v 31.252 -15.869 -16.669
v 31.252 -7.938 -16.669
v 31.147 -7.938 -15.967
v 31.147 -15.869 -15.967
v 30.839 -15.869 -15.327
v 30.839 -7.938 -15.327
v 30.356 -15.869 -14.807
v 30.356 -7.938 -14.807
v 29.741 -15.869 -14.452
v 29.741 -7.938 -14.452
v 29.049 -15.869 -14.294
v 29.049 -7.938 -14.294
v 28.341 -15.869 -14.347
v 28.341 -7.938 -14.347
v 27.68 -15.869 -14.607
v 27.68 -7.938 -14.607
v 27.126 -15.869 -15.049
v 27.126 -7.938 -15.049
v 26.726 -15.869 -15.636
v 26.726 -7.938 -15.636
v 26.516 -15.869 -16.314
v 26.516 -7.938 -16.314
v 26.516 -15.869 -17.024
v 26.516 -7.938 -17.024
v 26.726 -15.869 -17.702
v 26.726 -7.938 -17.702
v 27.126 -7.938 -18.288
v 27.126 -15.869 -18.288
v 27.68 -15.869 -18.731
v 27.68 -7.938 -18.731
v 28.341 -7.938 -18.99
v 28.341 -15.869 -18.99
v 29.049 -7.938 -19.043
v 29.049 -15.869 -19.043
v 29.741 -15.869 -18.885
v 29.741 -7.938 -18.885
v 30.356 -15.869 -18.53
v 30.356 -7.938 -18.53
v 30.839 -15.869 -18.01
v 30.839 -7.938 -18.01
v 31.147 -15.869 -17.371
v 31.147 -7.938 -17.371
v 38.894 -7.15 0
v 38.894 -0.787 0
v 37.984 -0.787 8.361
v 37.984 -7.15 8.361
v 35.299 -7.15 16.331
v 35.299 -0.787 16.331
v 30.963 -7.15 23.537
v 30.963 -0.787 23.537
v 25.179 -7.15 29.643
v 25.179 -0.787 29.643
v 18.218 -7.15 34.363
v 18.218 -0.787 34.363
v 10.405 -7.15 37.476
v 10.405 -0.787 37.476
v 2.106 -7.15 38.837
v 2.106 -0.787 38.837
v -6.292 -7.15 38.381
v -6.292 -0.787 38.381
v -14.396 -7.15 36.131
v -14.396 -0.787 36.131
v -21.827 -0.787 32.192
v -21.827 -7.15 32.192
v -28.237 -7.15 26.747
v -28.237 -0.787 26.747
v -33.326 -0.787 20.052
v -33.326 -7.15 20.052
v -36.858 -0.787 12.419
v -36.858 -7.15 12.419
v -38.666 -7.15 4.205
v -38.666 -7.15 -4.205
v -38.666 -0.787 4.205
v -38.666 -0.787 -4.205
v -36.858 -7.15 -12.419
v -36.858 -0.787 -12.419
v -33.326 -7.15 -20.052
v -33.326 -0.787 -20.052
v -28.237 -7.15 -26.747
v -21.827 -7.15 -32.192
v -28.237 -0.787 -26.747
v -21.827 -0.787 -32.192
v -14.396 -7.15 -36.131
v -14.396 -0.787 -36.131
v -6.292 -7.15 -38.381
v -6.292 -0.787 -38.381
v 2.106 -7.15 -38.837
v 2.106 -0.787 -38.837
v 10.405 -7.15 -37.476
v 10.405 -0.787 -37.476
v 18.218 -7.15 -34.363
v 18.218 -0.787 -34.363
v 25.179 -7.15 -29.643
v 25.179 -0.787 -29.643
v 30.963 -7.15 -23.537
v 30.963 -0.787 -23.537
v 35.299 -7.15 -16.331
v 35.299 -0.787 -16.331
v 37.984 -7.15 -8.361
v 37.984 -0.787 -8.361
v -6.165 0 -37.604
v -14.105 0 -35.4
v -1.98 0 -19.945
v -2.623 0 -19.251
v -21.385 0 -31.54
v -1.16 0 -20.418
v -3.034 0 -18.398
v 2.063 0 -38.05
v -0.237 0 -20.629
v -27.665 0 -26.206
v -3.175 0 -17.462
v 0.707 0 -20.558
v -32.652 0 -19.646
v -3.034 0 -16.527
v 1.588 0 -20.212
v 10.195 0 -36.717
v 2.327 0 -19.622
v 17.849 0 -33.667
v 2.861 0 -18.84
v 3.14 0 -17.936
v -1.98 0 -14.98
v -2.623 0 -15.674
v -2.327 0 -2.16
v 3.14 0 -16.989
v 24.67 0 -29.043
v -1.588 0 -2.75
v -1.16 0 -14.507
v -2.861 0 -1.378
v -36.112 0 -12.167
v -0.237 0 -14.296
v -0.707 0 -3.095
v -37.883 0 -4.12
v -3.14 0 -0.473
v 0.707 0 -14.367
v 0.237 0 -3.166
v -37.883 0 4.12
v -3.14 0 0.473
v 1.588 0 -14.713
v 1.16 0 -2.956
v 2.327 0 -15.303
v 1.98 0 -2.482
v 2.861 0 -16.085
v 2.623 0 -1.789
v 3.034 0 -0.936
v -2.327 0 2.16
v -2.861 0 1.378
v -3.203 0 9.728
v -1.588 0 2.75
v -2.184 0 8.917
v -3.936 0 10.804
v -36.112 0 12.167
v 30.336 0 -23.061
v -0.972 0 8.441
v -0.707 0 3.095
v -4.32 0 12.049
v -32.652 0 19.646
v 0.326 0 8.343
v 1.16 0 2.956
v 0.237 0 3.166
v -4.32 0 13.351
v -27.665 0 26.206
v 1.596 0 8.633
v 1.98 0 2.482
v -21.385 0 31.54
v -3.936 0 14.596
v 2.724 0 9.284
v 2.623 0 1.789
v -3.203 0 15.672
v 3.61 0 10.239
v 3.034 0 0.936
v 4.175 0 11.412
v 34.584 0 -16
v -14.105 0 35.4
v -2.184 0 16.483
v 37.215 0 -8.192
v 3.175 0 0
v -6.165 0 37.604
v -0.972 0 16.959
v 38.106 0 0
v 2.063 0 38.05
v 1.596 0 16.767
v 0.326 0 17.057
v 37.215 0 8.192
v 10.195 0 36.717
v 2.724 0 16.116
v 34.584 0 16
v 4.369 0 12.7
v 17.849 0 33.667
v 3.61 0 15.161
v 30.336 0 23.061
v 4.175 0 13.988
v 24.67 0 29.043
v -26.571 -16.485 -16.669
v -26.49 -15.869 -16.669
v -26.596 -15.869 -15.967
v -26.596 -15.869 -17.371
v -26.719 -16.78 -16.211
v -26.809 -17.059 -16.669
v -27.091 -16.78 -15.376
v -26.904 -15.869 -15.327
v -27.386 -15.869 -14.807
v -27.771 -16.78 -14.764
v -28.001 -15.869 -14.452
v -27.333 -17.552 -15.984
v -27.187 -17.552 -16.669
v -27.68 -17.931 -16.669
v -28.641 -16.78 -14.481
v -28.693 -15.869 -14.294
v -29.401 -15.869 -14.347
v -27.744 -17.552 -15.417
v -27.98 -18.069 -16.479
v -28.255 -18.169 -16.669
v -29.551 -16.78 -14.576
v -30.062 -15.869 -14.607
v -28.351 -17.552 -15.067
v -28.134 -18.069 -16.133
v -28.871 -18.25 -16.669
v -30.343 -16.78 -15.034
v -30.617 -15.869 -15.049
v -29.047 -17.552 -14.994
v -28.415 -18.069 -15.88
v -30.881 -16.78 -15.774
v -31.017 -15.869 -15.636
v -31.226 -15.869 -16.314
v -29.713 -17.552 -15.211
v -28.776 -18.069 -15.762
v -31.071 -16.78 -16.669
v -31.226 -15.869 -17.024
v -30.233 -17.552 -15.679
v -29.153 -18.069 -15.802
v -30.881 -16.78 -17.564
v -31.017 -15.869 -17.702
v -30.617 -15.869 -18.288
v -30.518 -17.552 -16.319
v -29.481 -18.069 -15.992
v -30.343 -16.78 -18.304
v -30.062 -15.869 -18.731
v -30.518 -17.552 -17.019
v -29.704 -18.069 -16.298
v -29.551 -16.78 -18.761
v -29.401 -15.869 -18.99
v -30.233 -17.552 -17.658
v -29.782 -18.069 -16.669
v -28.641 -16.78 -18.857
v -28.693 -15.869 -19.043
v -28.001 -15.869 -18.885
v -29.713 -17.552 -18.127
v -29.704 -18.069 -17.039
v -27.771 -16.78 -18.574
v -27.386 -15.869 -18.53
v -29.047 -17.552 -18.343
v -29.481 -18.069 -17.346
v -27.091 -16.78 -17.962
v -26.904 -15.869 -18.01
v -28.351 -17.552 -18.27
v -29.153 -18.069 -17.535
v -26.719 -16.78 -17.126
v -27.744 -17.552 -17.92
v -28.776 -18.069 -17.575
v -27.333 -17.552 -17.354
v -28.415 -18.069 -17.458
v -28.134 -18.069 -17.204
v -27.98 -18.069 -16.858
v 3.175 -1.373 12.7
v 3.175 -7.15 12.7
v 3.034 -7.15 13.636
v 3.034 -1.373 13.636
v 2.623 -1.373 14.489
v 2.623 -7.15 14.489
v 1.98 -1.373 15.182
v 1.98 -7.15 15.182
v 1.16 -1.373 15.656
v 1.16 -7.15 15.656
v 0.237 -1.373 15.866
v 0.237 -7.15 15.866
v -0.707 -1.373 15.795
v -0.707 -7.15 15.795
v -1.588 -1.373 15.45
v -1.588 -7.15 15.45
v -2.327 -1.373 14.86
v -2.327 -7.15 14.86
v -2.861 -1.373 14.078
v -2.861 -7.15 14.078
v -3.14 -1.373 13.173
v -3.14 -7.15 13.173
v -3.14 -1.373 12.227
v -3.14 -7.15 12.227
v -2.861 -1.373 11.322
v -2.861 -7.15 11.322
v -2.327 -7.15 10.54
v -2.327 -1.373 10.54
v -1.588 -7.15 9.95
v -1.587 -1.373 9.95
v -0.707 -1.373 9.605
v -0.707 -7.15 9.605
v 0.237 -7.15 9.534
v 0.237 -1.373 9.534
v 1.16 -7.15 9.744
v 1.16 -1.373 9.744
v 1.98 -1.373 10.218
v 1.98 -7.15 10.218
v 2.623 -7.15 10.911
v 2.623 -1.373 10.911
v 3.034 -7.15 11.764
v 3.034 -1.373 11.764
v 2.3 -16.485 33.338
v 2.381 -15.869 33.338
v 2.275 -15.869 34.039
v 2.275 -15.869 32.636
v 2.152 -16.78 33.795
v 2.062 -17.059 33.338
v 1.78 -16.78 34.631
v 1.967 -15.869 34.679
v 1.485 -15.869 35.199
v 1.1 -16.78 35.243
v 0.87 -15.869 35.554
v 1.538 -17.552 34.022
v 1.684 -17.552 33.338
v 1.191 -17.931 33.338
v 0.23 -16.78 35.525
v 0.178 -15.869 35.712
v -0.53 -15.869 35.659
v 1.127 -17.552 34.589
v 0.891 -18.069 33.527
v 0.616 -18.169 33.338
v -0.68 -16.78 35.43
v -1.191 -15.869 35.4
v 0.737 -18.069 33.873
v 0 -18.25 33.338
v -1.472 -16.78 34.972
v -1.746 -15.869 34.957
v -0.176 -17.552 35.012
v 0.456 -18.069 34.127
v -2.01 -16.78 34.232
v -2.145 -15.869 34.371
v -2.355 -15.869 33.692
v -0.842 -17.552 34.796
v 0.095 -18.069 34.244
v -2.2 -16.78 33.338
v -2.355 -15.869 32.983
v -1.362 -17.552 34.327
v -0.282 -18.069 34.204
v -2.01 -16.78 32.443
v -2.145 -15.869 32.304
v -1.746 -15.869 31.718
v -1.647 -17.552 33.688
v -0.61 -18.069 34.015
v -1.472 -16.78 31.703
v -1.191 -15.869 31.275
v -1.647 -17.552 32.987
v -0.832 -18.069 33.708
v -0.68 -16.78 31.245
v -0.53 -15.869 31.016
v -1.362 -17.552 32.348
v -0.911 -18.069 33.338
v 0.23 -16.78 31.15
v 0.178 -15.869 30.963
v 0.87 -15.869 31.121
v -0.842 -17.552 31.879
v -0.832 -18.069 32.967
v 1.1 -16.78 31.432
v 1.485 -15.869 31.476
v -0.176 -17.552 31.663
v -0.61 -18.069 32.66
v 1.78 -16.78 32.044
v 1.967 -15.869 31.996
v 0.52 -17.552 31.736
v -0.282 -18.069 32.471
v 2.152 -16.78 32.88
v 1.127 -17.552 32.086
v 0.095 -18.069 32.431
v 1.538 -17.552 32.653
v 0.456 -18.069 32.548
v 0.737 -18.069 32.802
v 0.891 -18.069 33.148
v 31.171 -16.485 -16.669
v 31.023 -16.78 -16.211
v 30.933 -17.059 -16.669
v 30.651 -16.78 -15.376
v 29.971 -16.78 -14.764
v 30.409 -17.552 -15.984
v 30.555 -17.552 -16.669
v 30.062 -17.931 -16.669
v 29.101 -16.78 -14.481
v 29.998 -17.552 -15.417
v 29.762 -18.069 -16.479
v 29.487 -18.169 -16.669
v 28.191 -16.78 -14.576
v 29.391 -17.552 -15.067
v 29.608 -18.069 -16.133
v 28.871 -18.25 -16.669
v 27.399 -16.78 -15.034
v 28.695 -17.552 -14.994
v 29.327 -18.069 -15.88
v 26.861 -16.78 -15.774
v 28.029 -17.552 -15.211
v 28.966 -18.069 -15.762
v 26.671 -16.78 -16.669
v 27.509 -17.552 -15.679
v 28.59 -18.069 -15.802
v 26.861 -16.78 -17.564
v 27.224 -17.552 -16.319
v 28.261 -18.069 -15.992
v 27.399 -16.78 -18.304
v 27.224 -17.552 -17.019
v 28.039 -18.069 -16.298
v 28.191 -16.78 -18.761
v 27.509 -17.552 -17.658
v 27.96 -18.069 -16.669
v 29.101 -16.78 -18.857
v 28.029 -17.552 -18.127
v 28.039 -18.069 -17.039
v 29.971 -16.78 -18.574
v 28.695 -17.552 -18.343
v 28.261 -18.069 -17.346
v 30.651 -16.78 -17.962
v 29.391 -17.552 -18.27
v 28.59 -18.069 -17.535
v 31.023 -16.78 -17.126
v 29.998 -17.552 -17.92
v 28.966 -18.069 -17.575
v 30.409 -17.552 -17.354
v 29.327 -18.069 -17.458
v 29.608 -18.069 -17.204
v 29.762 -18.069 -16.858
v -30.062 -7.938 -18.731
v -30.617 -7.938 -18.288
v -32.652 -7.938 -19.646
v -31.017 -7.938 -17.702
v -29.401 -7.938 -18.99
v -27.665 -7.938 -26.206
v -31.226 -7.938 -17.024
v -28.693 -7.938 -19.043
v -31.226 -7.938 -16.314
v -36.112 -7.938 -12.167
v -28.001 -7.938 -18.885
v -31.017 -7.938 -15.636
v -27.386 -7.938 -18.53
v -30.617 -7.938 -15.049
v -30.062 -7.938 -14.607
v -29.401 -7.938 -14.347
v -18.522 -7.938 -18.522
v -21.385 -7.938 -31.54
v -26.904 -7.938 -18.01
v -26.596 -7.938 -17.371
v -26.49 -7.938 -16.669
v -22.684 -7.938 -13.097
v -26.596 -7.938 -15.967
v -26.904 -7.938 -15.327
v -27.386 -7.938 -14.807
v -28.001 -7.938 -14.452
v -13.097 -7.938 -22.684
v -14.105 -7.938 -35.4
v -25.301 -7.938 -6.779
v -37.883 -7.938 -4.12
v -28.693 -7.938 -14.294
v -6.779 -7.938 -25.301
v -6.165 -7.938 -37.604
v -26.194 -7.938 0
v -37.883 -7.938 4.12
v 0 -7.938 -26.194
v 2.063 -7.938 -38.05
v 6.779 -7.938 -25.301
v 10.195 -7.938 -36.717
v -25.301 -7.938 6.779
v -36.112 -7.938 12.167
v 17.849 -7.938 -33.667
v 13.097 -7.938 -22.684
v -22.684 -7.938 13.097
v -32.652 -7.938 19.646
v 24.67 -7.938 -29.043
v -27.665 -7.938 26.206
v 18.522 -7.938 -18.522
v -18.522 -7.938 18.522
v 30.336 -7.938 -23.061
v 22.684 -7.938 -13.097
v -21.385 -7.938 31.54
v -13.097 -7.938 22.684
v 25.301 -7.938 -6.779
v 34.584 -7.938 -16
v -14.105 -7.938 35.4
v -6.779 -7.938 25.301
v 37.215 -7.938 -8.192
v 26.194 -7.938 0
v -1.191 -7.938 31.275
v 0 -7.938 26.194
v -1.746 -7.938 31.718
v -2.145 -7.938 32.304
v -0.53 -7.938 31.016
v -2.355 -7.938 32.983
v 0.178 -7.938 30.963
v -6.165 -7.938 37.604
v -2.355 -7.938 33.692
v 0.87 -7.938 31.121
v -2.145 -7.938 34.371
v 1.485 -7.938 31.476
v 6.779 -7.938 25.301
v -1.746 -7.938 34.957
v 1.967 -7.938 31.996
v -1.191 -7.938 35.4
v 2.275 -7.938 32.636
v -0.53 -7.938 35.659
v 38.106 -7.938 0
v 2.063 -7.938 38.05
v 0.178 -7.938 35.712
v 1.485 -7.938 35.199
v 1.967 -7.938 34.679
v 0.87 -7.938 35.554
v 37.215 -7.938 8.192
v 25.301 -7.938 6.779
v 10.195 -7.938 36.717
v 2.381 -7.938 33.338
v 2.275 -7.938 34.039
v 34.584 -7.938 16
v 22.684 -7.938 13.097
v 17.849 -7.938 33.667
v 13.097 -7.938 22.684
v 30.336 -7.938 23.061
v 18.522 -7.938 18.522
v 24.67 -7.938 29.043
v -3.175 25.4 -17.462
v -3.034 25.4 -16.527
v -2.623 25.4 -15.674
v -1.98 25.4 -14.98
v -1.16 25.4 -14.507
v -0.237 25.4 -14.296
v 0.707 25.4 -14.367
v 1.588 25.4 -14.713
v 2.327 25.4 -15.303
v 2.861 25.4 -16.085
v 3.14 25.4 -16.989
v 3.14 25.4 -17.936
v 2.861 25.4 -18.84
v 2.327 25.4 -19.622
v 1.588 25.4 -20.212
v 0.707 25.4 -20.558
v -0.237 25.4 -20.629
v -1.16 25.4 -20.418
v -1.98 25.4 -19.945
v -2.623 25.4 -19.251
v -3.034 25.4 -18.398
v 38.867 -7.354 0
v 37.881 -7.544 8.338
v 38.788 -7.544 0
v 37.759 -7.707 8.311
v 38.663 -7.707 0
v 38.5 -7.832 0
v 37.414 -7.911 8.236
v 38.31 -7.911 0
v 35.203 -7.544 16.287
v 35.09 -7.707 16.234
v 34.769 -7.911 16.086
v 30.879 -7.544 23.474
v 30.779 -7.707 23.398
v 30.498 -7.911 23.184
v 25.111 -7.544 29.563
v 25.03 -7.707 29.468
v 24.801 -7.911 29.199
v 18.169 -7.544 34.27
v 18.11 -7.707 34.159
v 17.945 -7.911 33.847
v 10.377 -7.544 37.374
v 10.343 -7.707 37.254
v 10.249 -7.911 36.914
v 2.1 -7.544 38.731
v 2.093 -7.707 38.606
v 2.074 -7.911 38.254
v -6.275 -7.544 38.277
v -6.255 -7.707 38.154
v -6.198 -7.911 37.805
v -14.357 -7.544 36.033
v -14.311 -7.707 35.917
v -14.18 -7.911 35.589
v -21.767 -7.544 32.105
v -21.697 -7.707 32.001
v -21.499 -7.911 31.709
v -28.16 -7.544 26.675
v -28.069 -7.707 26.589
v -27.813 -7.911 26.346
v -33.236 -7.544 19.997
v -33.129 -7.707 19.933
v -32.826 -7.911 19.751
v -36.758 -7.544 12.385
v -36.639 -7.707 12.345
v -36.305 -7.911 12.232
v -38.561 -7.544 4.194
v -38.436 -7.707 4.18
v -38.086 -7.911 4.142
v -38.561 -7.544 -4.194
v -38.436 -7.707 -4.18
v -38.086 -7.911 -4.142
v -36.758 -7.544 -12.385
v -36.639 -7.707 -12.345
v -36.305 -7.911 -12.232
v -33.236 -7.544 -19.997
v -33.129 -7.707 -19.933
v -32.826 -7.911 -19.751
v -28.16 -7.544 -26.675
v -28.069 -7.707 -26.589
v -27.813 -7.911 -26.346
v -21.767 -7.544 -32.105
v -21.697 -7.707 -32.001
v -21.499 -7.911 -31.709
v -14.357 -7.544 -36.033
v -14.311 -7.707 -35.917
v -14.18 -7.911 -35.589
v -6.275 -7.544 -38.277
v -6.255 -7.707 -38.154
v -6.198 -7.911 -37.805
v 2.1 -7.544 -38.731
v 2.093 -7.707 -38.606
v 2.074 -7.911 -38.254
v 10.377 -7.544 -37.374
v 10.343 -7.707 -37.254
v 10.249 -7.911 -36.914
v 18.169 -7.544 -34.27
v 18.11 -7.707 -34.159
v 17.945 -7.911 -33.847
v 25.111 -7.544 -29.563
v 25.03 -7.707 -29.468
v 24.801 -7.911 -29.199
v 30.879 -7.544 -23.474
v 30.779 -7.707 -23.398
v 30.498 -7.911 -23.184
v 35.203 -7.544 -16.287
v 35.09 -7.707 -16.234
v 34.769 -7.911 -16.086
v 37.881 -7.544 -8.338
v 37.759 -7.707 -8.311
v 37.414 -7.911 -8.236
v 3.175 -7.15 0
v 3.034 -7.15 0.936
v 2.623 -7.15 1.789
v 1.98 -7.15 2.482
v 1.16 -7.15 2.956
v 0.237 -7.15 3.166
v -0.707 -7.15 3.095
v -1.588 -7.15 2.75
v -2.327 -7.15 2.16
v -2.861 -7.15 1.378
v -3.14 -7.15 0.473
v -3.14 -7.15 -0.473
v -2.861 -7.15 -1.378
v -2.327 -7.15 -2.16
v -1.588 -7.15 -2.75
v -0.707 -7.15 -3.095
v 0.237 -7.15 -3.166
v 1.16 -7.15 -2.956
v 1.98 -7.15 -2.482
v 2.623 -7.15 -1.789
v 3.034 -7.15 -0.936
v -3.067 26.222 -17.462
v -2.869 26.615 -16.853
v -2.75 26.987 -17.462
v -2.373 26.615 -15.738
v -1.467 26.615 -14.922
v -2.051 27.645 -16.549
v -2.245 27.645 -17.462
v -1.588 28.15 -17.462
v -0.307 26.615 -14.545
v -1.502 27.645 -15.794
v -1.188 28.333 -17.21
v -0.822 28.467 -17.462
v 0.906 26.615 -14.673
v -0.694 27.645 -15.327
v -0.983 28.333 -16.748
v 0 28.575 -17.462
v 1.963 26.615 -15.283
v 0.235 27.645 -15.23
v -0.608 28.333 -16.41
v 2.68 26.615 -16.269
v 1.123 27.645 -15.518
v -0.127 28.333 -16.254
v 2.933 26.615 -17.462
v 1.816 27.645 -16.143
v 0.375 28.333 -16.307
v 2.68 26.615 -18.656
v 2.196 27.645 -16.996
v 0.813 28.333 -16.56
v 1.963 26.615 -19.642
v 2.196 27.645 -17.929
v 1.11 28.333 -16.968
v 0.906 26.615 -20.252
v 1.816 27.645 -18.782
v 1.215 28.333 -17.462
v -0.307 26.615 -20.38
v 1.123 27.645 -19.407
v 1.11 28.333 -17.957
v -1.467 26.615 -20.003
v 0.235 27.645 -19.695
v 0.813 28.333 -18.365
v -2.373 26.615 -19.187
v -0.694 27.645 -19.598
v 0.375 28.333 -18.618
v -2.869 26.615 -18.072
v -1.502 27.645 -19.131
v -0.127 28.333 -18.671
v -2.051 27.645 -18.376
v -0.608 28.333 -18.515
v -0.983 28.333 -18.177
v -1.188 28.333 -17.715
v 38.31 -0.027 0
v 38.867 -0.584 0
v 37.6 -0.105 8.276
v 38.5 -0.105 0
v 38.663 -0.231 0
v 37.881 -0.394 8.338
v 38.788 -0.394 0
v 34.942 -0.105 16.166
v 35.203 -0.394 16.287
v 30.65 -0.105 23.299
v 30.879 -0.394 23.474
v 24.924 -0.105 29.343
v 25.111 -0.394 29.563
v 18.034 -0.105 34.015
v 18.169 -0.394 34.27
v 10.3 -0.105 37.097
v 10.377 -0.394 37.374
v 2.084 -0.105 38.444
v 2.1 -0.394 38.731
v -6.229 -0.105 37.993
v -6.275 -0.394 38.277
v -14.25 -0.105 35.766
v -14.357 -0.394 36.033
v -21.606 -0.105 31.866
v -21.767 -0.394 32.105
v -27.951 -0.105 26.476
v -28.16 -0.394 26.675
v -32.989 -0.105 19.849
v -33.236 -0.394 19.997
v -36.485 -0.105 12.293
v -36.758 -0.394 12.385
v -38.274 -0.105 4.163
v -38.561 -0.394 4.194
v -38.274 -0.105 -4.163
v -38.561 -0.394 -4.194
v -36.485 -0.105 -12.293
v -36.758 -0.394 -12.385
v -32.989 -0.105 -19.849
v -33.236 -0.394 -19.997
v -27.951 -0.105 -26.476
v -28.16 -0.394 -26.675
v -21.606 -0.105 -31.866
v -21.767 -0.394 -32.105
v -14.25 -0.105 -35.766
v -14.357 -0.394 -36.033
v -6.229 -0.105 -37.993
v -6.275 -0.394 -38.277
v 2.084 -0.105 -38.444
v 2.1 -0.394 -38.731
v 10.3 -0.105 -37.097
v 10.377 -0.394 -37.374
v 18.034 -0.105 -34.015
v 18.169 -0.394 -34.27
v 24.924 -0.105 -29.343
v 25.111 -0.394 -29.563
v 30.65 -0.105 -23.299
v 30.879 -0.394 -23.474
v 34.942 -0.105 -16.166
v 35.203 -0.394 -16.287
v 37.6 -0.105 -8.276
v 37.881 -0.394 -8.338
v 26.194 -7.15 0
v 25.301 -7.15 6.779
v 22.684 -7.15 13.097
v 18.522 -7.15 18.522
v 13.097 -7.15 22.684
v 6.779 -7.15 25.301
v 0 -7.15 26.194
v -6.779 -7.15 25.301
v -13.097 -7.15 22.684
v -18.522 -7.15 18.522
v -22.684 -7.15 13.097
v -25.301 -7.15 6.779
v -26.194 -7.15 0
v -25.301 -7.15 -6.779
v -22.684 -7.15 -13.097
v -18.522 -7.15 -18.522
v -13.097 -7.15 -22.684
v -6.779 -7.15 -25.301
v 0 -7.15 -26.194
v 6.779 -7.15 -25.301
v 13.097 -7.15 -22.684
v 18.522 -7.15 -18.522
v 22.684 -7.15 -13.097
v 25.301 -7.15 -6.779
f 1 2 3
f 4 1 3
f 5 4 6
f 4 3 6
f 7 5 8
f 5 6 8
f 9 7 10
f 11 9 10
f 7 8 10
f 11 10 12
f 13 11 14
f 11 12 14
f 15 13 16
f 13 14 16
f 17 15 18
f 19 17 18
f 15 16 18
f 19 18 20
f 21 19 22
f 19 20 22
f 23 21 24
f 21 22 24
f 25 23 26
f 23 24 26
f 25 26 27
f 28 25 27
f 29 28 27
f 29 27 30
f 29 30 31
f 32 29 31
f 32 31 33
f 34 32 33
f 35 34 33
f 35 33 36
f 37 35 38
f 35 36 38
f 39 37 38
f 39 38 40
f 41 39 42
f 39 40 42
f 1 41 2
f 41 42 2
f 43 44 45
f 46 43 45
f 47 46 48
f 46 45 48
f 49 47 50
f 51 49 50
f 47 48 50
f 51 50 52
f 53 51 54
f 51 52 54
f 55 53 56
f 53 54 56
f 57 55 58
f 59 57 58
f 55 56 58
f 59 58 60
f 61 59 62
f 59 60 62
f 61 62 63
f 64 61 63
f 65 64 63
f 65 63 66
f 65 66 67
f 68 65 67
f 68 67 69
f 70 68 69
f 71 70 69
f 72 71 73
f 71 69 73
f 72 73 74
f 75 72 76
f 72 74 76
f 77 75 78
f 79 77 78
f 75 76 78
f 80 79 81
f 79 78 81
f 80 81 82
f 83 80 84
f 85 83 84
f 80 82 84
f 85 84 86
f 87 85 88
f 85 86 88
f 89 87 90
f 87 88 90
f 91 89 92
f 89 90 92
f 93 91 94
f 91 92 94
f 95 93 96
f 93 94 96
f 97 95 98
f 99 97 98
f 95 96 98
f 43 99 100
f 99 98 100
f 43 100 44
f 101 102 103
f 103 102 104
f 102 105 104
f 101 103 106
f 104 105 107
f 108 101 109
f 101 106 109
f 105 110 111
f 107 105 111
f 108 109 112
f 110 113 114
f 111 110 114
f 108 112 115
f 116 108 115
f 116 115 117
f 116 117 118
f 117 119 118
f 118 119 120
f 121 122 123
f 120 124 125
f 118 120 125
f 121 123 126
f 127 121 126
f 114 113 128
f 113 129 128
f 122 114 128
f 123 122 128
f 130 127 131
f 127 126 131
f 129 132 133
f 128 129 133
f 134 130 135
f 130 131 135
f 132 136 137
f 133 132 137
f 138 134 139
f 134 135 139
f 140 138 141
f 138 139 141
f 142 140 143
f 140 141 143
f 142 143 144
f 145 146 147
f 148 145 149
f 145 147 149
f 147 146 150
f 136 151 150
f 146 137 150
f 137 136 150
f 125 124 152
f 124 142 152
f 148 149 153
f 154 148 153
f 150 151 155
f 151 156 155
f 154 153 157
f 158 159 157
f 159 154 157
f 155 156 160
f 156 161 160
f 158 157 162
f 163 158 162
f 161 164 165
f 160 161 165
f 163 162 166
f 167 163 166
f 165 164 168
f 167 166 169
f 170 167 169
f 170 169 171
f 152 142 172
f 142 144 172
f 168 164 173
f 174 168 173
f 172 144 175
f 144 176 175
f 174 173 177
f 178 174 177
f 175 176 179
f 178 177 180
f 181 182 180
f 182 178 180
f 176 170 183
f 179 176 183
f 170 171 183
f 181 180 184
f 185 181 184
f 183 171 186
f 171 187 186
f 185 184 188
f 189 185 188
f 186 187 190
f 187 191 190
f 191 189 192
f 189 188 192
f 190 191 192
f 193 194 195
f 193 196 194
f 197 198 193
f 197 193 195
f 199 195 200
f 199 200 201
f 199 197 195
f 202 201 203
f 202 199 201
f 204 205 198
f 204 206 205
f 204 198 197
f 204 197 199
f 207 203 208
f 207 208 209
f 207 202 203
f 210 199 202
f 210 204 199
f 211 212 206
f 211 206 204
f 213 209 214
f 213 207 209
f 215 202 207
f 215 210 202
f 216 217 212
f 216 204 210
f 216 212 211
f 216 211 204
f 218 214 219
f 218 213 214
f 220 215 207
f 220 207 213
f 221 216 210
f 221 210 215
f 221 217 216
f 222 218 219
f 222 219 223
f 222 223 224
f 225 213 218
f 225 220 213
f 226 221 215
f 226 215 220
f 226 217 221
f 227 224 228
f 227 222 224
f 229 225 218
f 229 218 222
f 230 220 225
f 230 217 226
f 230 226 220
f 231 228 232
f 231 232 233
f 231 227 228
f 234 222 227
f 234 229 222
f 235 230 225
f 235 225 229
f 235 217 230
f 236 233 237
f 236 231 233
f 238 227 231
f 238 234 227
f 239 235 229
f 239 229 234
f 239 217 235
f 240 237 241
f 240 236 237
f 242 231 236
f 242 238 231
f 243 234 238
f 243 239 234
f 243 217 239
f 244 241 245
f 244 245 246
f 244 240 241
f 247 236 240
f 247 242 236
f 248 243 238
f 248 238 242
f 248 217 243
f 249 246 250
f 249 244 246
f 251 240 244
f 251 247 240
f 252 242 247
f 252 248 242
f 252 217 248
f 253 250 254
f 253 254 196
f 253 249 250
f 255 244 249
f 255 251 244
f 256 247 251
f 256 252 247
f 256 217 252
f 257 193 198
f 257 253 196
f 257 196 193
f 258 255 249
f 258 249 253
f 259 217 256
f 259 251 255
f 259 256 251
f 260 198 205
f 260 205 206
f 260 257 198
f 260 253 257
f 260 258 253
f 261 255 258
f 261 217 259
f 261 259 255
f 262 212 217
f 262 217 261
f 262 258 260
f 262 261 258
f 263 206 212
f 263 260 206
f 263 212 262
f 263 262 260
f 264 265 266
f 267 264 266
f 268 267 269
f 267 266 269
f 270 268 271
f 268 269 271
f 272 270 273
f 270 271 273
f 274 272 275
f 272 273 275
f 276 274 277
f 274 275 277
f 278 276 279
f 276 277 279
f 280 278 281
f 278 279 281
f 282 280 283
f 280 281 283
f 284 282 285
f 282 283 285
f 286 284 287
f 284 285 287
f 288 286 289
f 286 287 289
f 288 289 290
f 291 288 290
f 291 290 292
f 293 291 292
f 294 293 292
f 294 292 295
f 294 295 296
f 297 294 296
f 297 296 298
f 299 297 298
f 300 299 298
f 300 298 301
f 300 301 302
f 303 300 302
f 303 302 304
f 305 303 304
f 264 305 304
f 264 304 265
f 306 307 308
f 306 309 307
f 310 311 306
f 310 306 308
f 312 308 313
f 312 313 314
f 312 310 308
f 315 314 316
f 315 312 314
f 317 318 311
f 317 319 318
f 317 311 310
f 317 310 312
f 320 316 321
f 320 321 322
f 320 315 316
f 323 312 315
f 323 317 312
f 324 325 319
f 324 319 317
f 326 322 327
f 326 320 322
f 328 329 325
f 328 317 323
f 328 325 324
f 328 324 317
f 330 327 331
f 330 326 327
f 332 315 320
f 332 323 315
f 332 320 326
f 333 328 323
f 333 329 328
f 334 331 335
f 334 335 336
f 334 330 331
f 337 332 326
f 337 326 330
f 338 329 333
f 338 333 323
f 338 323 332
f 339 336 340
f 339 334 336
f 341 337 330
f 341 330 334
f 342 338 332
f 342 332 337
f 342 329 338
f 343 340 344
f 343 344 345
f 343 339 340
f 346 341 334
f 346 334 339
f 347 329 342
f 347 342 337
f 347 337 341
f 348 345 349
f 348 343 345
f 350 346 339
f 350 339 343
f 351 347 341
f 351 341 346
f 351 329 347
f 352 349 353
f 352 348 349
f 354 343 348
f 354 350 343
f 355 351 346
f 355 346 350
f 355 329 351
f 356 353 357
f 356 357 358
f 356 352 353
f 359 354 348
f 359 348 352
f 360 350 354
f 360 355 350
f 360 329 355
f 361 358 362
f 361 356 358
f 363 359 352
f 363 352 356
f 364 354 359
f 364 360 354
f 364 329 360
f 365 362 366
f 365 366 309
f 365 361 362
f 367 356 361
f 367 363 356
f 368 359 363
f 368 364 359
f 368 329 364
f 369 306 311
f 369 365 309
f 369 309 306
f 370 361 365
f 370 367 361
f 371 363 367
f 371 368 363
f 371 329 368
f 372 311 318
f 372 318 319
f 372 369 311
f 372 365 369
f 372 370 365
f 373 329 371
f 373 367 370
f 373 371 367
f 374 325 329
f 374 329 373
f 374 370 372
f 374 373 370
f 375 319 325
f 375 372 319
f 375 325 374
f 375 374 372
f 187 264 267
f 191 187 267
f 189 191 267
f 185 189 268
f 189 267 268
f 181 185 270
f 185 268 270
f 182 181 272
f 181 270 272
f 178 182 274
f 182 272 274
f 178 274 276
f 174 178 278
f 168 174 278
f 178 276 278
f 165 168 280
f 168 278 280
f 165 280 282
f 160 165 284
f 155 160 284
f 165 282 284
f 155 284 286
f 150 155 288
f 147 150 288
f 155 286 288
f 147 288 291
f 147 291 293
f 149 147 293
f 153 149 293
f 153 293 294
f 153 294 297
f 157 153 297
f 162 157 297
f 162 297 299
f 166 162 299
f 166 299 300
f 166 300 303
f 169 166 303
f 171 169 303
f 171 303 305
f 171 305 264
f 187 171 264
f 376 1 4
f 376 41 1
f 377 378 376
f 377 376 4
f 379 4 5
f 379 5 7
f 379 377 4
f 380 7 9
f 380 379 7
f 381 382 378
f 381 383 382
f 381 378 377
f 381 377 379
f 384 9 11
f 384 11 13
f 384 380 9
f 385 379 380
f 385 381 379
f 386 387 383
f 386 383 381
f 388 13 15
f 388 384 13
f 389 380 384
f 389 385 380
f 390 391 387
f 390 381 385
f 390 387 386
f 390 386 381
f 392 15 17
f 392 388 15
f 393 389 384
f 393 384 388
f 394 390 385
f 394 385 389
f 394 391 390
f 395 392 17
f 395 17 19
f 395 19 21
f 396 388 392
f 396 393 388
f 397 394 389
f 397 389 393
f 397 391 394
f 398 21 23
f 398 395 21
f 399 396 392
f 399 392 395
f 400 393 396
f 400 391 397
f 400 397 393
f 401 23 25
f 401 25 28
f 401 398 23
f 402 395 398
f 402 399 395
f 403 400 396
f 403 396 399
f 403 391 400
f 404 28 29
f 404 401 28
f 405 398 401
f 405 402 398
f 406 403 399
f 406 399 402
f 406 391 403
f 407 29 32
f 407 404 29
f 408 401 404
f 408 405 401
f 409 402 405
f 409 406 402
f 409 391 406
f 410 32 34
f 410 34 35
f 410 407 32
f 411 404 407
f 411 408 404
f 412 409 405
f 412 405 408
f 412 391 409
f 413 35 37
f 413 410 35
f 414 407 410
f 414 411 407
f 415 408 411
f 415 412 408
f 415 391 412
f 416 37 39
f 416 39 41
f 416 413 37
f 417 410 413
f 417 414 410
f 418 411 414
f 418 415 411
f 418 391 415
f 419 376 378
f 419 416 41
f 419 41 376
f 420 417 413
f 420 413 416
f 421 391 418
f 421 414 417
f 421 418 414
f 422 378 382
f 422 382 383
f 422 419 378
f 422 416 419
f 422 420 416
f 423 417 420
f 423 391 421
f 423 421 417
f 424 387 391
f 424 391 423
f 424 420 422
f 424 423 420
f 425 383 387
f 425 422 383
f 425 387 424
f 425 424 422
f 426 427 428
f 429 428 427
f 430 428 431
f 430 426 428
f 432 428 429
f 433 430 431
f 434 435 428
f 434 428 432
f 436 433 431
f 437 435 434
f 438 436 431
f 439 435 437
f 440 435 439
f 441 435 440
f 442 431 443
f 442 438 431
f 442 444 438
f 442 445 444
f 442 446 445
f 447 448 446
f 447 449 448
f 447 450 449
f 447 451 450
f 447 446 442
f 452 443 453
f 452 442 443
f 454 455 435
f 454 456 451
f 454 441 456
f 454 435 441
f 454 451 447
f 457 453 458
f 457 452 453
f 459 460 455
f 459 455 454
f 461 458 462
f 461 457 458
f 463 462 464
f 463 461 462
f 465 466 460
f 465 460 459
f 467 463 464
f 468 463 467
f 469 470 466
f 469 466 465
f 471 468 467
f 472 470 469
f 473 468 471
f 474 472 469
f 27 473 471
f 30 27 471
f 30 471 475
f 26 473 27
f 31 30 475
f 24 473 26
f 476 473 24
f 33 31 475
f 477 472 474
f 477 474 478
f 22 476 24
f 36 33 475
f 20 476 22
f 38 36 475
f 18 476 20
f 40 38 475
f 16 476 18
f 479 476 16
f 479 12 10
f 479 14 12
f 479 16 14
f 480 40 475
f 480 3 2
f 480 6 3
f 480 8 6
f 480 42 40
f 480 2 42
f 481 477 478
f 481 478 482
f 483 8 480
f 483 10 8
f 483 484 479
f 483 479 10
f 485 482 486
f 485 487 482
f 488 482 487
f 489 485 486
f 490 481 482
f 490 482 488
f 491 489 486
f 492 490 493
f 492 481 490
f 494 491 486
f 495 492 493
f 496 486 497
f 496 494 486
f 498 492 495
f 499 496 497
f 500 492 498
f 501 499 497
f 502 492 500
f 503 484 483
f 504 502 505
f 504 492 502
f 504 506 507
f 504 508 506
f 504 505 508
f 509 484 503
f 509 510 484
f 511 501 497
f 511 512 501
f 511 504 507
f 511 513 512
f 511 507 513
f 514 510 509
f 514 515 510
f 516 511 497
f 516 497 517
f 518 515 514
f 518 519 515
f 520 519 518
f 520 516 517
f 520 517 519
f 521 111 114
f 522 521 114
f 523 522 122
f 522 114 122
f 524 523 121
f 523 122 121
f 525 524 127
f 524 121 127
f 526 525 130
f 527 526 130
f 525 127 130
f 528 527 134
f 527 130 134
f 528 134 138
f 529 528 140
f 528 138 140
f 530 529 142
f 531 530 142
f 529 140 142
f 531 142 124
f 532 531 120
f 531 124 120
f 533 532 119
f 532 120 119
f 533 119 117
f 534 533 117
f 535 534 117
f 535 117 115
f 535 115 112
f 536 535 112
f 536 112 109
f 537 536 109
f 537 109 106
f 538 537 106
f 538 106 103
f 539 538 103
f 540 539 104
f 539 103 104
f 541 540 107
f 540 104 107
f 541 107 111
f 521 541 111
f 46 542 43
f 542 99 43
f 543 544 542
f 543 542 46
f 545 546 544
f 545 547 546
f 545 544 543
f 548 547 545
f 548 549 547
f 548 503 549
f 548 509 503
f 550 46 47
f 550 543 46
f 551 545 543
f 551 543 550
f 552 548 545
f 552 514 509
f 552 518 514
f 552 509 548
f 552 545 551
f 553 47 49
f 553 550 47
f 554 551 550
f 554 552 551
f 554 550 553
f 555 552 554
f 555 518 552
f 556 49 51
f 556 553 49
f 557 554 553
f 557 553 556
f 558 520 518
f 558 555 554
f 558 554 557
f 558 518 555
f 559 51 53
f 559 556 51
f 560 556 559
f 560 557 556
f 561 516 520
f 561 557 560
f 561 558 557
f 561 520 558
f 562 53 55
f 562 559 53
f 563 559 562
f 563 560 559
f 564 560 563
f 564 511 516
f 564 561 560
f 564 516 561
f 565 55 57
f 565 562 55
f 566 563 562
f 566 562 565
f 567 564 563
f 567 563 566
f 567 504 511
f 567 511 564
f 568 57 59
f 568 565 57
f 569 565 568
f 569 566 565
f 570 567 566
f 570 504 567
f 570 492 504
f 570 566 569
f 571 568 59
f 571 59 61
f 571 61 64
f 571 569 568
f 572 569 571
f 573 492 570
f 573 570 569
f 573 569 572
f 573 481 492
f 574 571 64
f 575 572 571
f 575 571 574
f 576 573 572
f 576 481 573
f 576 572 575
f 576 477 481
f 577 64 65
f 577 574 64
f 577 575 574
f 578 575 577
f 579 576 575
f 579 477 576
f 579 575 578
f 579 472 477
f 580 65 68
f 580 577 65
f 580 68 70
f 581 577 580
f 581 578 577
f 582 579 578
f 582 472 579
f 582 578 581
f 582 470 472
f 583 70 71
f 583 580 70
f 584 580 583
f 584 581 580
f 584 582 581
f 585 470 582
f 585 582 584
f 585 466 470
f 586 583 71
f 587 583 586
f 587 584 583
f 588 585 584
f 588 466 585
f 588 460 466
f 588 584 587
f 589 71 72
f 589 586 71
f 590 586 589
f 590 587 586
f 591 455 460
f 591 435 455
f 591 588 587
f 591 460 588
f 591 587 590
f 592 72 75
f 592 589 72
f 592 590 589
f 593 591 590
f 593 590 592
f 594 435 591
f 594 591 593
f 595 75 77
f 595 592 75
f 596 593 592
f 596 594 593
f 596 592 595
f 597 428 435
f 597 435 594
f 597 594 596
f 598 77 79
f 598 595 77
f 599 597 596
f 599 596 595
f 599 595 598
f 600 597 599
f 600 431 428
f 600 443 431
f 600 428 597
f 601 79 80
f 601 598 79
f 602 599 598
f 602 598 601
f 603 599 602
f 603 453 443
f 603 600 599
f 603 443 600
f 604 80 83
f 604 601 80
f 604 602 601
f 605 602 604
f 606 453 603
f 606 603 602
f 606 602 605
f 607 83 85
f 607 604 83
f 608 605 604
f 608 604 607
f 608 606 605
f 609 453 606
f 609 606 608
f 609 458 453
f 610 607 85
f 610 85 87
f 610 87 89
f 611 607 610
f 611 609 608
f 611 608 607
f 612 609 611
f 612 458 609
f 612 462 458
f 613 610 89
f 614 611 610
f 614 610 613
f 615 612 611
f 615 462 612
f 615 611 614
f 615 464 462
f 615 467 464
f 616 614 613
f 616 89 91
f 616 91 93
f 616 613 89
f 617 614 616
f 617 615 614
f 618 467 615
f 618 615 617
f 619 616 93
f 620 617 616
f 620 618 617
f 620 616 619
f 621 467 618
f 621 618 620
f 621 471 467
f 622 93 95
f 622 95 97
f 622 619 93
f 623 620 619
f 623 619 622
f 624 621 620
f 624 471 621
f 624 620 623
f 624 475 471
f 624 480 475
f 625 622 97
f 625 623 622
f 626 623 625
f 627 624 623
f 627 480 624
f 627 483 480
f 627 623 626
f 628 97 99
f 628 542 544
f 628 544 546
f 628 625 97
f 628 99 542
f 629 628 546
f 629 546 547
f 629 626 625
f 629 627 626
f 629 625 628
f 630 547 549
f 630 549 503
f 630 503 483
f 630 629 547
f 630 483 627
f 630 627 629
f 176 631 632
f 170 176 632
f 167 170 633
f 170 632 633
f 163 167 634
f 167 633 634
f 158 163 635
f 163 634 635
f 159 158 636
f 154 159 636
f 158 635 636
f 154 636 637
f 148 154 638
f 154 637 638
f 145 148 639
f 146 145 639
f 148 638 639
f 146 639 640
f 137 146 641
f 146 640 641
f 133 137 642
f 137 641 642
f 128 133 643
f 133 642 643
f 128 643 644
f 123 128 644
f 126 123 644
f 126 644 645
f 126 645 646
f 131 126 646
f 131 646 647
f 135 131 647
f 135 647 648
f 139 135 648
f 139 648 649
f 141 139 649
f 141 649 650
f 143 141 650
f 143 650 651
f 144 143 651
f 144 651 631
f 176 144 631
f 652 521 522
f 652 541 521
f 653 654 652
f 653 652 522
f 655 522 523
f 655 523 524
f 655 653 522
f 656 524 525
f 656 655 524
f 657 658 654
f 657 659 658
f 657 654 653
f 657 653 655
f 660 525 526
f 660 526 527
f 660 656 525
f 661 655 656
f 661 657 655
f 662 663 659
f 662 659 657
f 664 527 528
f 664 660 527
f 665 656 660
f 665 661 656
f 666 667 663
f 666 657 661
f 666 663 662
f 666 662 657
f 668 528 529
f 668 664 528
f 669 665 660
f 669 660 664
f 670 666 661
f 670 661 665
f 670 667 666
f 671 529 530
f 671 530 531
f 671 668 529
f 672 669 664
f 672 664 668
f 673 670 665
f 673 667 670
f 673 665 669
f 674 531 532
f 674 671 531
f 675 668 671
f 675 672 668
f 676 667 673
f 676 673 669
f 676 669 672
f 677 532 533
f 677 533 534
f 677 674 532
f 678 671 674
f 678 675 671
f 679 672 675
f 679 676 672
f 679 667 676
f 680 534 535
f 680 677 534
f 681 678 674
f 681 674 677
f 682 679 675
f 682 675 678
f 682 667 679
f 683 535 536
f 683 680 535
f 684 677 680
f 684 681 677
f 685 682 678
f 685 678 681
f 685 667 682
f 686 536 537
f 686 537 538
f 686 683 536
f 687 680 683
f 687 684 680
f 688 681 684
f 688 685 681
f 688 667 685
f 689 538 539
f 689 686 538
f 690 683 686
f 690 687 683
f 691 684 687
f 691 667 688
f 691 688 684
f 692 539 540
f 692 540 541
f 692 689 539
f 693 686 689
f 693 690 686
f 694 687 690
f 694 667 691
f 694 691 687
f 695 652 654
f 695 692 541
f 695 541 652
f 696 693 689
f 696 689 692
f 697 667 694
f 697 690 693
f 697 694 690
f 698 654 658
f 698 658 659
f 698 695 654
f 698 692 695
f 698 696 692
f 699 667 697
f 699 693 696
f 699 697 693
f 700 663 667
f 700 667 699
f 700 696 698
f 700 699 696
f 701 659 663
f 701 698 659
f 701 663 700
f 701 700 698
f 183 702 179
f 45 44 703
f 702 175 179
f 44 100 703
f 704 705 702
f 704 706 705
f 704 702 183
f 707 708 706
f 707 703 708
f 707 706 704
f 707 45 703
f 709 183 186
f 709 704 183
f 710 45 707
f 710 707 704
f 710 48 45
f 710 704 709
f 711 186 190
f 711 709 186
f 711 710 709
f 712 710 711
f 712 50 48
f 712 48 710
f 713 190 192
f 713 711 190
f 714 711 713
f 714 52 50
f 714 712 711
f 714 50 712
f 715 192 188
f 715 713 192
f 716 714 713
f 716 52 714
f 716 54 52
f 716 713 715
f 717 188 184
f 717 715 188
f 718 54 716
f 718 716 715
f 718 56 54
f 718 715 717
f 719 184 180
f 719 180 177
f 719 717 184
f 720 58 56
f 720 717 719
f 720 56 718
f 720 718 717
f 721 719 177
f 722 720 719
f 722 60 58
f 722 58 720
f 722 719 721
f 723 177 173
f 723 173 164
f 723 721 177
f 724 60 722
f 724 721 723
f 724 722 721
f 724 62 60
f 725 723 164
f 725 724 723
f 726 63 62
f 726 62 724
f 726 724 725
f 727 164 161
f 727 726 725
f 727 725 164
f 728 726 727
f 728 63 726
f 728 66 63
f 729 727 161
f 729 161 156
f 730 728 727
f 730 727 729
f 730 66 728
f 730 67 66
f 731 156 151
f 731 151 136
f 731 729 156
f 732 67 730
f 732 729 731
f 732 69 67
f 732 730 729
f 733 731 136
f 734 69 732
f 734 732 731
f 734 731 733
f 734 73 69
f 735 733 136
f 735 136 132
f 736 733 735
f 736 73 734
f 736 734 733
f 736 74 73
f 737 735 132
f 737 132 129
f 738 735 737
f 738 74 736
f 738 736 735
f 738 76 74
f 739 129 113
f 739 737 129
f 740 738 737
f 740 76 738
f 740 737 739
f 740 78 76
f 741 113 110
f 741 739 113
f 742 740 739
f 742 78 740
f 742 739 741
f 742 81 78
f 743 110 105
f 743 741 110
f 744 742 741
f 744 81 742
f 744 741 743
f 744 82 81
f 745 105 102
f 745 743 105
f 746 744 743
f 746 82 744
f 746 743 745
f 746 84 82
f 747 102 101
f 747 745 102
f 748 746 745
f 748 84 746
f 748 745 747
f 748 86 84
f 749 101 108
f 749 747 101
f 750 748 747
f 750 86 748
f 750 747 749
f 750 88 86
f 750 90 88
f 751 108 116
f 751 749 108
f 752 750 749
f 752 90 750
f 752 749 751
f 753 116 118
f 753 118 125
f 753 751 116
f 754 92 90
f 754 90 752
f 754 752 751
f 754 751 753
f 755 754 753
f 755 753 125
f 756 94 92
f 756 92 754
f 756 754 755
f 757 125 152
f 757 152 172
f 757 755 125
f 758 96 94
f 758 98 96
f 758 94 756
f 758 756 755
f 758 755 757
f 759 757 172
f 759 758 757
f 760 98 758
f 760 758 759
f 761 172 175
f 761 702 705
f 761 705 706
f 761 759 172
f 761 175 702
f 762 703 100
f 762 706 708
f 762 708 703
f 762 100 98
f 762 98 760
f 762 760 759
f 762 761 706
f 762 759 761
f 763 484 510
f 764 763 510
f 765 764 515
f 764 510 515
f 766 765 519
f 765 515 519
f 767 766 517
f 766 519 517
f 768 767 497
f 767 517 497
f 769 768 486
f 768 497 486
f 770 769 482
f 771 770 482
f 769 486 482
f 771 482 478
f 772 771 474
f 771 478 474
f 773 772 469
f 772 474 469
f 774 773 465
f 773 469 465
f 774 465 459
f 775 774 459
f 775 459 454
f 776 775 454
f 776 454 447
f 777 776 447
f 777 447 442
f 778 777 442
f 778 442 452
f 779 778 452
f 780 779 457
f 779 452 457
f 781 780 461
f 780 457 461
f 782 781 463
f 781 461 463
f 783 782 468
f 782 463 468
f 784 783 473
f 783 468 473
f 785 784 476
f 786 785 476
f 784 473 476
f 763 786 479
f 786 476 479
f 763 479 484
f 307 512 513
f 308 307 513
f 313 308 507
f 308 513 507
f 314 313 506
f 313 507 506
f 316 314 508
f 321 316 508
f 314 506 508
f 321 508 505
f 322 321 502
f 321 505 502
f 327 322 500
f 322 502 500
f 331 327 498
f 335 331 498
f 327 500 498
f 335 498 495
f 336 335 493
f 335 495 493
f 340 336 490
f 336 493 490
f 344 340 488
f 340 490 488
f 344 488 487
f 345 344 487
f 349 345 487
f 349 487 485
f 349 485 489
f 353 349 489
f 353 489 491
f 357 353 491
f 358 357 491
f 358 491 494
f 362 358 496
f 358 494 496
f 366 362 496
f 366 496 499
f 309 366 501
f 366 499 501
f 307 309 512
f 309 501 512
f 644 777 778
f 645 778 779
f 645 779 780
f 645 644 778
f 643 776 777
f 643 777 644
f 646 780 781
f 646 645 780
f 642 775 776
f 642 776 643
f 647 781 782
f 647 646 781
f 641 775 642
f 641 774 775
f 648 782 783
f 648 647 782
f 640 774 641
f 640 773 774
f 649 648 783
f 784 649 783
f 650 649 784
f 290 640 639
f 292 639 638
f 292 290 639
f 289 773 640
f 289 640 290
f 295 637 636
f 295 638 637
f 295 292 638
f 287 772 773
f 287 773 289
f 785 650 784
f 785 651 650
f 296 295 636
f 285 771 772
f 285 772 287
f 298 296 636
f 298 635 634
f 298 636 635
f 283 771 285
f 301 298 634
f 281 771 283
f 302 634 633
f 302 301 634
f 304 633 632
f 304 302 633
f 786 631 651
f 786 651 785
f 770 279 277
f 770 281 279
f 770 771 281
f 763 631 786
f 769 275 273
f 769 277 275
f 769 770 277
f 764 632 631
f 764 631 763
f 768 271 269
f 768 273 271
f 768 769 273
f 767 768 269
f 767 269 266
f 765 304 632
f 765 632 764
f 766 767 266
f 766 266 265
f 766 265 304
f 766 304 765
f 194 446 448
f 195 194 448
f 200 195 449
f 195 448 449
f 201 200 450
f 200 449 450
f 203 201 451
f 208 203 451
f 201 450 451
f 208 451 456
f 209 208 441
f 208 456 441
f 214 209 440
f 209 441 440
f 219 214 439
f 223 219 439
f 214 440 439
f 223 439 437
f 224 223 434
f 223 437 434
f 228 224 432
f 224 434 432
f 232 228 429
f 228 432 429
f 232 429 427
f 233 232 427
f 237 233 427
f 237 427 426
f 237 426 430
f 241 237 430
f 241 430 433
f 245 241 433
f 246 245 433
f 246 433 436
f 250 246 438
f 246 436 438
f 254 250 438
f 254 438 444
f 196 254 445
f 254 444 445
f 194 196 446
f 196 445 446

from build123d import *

# Parameters (mm, degrees)
F0_R            = 38.89375
F1_DEPTH        = 7.9375
F2_R            = 26.19375
F3_DEPTH        = 0.7874
F4_R            = 2.38125
F5_DEPTH        = 10.3124
F6_R            = 2.38125
F7_R            = 3.175
F8_DEPTH        = 7.1511
F10_D           = 6.35
F10_CSINK_D     = 8.7376
F10_CSINK_ANGLE = 82
F11_R           = 3.175
F12_DEPTH       = 28.575
F13_R           = 3.175
F14_R           = 0.7874


with BuildPart() as f1:
    # F0 (on Front) → F1 (new body)
    with BuildSketch(Plane.XZ):
        Circle(F0_R)
    extrude(amount=F1_DEPTH)

    # F2 (on face) → F3 (cut)
    with BuildSketch(Plane.XZ.offset(7.9375)):
        Circle(F2_R)
    extrude(amount=-F3_DEPTH, mode=Mode.SUBTRACT)

    # F4 (on face) → F5 (join)
    with BuildSketch(Plane.XZ.offset(7.9375)):
        with Locations((0, 33.3375)):
            Circle(F4_R)
        with Locations((-28.871122, -16.66875)):
            Circle(F4_R)
        with Locations((28.871122, -16.66875)):
            Circle(F4_R)
    extrude(amount=F5_DEPTH)

    # F6
    f6_edges = [f1.edges().sort_by_distance(p)[0] for p in [
        (-2.38125, -18.2499, 33.3375),
        (26.489872, -18.2499, -16.66875),
        (-31.252372, -18.2499, -16.66875),
    ]]
    fillet(f6_edges, radius=F6_R)

    # F7 (on face) → F8 (cut, through all)
    with BuildSketch(Plane.XZ.offset(7.1501)):
        Circle(F7_R)
        with Locations((0, 12.7)):
            Circle(F7_R)
    extrude(amount=-F8_DEPTH, mode=Mode.SUBTRACT)

    # F10 (through all)
    with Locations(Plane(origin=(0, 0, 0), x_dir=(-1, 0, 0), z_dir=(0, 1, 0))):
        with Locations((0, 12.7)):
            CounterSinkHole(F10_D / 2, F10_CSINK_D / 2, counter_sink_angle=F10_CSINK_ANGLE)

    # F11 (on face) → F12 (join)
    with BuildSketch(Plane(origin=(0, 0, 0), x_dir=(-1, 0, 0), z_dir=(0, 1, 0))):
        with Locations((0, -17.4625)):
            Circle(F11_R)
    extrude(amount=F12_DEPTH)

    # F13
    f13_edges = [f1.edges().sort_by_distance(p)[0] for p in [
        (3.175, 28.575, -17.4625),
    ]]
    fillet(f13_edges, radius=F13_R)

    # F14
    f14_edges = [f1.edges().sort_by_distance(p)[0] for p in [
        (-38.89375, -7.9375, 0),
        (-38.89375, 0, 0),
    ]]
    fillet(f14_edges, radius=F14_R)


solid = f1.part
